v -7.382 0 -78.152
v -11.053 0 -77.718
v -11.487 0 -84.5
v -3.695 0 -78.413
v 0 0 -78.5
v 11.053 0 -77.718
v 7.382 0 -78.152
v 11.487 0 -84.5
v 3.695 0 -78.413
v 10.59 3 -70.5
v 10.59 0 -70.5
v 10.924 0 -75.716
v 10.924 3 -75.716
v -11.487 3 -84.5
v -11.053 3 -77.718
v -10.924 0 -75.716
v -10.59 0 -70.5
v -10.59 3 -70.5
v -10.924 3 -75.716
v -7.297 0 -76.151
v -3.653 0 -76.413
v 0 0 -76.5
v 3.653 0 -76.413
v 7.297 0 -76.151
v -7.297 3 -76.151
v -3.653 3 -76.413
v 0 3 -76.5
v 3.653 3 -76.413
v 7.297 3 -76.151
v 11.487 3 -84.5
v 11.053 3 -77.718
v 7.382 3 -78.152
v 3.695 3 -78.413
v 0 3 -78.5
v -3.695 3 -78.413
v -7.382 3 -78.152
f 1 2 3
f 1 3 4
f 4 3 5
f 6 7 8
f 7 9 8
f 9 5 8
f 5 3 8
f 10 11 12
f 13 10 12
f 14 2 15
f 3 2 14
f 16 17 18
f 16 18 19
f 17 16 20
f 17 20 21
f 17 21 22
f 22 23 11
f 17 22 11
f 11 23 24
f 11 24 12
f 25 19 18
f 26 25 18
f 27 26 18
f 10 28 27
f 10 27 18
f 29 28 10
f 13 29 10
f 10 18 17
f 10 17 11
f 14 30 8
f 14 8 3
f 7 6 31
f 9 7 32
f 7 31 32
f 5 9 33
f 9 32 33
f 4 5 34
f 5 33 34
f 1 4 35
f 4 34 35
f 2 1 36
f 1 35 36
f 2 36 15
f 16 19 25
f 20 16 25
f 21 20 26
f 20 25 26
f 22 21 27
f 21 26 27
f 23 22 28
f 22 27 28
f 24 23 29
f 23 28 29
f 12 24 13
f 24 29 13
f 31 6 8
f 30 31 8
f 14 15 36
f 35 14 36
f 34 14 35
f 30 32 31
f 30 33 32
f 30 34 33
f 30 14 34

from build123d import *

# Parameters (mm, degrees)
BOSS_EXTRUDE1_DEPTH     = 3
CUT_EXTRUDE4_DEPTH      = 1
CUT_EXTRUDE4_DEPTH_BACK = 4
CUT_EXTRUDE5_DEPTH      = 1
CUT_EXTRUDE5_DEPTH_BACK = 4


with BuildPart() as part:
    # Sketch1 → Boss-Extrude1 (new body)
    with BuildSketch(Plane(origin=(0, 0, 0), x_dir=(1, 0, 0), z_dir=(0, 1, 0))):
        Polygon((-12, 92.5), (0, 92.5), (0, 62.5), (-10.077512647, 62.5), align=None)
    boss_extrude1 = extrude(amount=BOSS_EXTRUDE1_DEPTH)

    # Mirror1: Boss-Extrude1 across plane
    add(boss_extrude1.mirror(Plane(origin=(0, 0, 0), x_dir=(0, 0, 1), z_dir=(1, 0, 0))))

    # Sketch6 → Cut-Extrude4 (cut, two sides)
    with BuildSketch(Plane(origin=(0, 3, 0), x_dir=(1, 0, 0), z_dir=(0, 1, 0))) as cut_extrude4_sk:
        Polygon((-10.590175941, 70.5), (10.590175941, 70.5), (10.077512647, 62.5), (-10.077512647, 62.5), align=None)
        Polygon((11.487336706, 84.5), (-11.487336706, 84.5), (-12, 92.5), (12, 92.5), align=None)
    extrude(amount=CUT_EXTRUDE4_DEPTH, mode=Mode.SUBTRACT)
    extrude(cut_extrude4_sk.sketch, amount=-CUT_EXTRUDE4_DEPTH_BACK, mode=Mode.SUBTRACT)

    # Sketch7 → Cut-Extrude5 (cut, two sides)
    with BuildSketch(Plane(origin=(0, 3, 0), x_dir=(1, 0, 0), z_dir=(0, 1, 0))) as cut_extrude5_sk:
        with BuildLine():
            Line((-11.198534807, 77.697122329), (-10.924429943, 75.71596153))
            ThreePointArc((-10.924429943, 75.71596153), (0, 76.5), (10.924429943, 75.71596153))
            Line((10.924429943, 75.71596153), (11.052726282, 77.717998184))
            ThreePointArc((11.052726282, 77.717998184), (-0.073647687, 78.499965452), (-11.198534807, 77.697122329))
        make_face()
    extrude(amount=CUT_EXTRUDE5_DEPTH, mode=Mode.SUBTRACT)
    extrude(cut_extrude5_sk.sketch, amount=-CUT_EXTRUDE5_DEPTH_BACK, mode=Mode.SUBTRACT)


solid = part.part
